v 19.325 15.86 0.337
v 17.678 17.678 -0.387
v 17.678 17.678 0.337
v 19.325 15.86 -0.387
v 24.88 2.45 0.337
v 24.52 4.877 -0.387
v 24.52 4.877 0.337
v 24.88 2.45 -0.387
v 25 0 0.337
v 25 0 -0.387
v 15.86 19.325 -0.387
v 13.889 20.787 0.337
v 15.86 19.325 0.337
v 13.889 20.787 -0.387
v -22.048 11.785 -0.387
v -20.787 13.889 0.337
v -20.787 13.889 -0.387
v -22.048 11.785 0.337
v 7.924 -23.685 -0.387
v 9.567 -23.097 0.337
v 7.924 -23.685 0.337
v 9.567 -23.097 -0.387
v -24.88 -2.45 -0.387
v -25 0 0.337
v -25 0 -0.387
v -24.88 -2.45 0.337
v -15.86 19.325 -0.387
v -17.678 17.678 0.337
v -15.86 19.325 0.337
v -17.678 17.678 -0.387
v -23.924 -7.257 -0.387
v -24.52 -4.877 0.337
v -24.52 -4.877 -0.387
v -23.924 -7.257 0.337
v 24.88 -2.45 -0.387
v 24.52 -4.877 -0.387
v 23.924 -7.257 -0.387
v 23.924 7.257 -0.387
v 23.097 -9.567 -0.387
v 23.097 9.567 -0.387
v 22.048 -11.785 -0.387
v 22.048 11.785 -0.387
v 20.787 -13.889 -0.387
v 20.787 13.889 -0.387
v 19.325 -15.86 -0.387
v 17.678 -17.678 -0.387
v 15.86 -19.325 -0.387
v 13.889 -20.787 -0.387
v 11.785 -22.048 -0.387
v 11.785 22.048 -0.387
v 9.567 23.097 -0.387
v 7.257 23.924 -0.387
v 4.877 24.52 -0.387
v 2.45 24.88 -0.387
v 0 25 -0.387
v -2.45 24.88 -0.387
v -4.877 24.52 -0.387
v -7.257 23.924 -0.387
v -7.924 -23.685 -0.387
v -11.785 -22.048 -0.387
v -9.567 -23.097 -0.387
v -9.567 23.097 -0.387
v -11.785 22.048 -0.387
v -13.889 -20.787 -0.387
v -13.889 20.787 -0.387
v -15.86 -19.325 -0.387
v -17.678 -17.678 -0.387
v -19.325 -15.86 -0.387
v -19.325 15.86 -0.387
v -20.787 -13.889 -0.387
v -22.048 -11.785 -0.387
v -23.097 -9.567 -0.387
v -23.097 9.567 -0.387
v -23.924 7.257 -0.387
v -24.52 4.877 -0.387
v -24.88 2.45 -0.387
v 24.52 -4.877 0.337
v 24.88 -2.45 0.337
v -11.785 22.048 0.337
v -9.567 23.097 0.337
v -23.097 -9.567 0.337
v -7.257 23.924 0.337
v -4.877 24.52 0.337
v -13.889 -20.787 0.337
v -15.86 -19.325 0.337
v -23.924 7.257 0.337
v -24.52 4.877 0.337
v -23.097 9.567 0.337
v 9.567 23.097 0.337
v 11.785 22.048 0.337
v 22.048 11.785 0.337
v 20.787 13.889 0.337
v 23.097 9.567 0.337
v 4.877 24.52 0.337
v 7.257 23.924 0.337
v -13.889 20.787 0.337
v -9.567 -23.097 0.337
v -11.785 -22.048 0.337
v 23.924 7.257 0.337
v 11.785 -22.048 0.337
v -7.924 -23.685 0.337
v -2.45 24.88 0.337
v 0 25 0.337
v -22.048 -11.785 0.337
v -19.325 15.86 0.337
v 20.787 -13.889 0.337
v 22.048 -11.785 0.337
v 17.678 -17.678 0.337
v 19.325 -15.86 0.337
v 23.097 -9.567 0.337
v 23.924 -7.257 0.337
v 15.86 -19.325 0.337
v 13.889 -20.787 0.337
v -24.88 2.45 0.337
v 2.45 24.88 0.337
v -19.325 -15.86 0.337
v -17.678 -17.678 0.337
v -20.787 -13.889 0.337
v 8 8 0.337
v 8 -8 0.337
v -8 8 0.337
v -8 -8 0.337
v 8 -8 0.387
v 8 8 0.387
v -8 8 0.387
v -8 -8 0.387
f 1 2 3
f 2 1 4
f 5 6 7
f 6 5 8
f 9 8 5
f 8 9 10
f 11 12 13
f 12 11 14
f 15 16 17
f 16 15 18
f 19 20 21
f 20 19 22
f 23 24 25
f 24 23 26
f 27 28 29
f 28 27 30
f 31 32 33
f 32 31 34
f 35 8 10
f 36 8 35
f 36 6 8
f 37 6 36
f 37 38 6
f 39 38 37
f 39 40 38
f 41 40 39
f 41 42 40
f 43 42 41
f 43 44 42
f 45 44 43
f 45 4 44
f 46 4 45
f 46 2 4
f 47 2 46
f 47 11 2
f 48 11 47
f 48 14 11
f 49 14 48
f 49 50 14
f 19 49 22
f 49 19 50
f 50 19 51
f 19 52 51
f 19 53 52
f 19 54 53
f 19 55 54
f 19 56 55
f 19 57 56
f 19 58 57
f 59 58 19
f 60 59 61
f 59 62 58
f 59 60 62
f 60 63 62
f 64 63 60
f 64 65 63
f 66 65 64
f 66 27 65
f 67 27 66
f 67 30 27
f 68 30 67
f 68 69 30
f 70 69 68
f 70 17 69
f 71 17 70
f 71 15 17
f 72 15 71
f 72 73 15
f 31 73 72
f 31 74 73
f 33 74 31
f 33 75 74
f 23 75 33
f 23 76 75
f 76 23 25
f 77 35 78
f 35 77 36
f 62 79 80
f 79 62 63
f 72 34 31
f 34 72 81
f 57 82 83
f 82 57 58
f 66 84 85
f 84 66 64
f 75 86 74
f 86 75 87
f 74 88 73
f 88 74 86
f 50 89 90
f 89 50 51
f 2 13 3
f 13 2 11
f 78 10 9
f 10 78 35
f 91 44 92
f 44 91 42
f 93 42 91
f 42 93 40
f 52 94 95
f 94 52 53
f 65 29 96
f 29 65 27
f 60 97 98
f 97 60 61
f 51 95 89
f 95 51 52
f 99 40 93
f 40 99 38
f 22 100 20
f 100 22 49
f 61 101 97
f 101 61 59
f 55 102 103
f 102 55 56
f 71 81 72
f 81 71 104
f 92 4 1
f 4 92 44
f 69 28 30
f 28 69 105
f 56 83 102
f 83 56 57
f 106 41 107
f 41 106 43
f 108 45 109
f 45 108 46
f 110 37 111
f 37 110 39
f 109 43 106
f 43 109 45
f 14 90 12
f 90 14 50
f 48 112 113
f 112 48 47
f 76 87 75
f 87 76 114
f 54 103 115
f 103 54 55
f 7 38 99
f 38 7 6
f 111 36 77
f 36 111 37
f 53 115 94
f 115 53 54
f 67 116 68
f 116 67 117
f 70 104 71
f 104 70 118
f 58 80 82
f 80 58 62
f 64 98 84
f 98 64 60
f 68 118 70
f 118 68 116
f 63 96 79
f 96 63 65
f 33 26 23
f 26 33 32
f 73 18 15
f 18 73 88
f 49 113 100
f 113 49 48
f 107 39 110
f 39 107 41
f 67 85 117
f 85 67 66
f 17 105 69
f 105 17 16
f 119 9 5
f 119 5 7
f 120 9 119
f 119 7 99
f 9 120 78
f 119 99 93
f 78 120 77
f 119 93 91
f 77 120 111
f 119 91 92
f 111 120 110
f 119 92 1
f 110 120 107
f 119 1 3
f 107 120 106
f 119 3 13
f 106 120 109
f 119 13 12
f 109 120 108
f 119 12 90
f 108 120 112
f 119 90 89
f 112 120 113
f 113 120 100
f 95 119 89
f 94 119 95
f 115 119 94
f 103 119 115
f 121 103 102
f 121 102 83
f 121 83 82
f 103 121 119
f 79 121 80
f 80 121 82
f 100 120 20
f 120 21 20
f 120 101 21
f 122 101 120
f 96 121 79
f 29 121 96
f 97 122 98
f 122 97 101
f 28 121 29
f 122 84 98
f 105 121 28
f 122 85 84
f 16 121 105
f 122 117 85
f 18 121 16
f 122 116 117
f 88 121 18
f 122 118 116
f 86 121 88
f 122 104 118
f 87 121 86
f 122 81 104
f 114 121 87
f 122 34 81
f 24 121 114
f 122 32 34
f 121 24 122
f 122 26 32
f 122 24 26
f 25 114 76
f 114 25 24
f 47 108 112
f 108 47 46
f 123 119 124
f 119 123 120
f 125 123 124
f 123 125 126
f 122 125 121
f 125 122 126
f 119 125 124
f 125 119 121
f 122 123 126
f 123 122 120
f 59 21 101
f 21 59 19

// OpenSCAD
// ============================================================================
// Atom Lithography Machine — Parametric OpenSCAD Module (S5.4-01)
// ============================================================================
// part_id           : S5.4-01
// parent_bom_id     : S5.4
// subsystem         : S5
// part_name         : Izotopik zenginlestirilmis 28Si/29Si (f=1%) epitaksiyel substrat partisi
// material          : Si
// temp_stage        : 300 K
// vacuum_grade      : Temizoda/UHV
// tolerance         : ±0.1% 29Si
// computed_mass_kg  : 0.00337
// envelope_mm       : 49.678 x 48.685 x 0.775
// design_maturity   : M0_M1_DETAILED_CAD_DESIGN_ONLY
// no_lab_measurement: true
// iec61508_certified: false
// semi_s2_certified : false
// Units: millimeters (mm)
// ============================================================================

$fn = 64;

// Nominal bounding envelope parameters (mm)
bbox_x = 49.6779;
bbox_y = 48.6854;
bbox_z = 0.7750;

// Part-specific parametric dimensions
wafer_od_mm = 50.0;
bom_stock_od_mm = 100.0;
thickness_mm = 0.775;
write_field_mm = 16.0;

// Interface / port parameters (mm)
port_active_epi_top_od = 50.000;
port_active_epi_top_bore = 16.000;
port_carrier_backside_od = 50.000;

module part_S5_4_01() {
  difference() {
    union() {
      // Dia 50 mm 28Si/29Si (f=1%) working wafer substrate
      translate([0.000, 0.000, -0.025]) cylinder(d=50.000, h=0.725, center=true);
      // Active 16x16 mm Arch-B write-field epi mesa (100 nm epi + 8 nm 28Si cap)
      translate([0.000, 0.000, 0.362]) cube([16.000, 16.000, 0.050], center=true);
    }
    // SEMI M1 16.0 mm primary orientation flat
    translate([0.000, -25.185, 0.000]) {
      hull() {
        translate([-8.500, 0, 0]) cylinder(d=3.000, h=1.500, center=true);
        translate([8.500, 0, 0]) cylinder(d=3.000, h=1.500, center=true);
      }
    }
  }
}

// World assembly mounting transform (global machine frame, mm / deg):
// translate([420.000, 0.000, 499.613]) rotate([0.000, 0.000, 0.000]) part_S5_4_01();

part_S5_4_01();
